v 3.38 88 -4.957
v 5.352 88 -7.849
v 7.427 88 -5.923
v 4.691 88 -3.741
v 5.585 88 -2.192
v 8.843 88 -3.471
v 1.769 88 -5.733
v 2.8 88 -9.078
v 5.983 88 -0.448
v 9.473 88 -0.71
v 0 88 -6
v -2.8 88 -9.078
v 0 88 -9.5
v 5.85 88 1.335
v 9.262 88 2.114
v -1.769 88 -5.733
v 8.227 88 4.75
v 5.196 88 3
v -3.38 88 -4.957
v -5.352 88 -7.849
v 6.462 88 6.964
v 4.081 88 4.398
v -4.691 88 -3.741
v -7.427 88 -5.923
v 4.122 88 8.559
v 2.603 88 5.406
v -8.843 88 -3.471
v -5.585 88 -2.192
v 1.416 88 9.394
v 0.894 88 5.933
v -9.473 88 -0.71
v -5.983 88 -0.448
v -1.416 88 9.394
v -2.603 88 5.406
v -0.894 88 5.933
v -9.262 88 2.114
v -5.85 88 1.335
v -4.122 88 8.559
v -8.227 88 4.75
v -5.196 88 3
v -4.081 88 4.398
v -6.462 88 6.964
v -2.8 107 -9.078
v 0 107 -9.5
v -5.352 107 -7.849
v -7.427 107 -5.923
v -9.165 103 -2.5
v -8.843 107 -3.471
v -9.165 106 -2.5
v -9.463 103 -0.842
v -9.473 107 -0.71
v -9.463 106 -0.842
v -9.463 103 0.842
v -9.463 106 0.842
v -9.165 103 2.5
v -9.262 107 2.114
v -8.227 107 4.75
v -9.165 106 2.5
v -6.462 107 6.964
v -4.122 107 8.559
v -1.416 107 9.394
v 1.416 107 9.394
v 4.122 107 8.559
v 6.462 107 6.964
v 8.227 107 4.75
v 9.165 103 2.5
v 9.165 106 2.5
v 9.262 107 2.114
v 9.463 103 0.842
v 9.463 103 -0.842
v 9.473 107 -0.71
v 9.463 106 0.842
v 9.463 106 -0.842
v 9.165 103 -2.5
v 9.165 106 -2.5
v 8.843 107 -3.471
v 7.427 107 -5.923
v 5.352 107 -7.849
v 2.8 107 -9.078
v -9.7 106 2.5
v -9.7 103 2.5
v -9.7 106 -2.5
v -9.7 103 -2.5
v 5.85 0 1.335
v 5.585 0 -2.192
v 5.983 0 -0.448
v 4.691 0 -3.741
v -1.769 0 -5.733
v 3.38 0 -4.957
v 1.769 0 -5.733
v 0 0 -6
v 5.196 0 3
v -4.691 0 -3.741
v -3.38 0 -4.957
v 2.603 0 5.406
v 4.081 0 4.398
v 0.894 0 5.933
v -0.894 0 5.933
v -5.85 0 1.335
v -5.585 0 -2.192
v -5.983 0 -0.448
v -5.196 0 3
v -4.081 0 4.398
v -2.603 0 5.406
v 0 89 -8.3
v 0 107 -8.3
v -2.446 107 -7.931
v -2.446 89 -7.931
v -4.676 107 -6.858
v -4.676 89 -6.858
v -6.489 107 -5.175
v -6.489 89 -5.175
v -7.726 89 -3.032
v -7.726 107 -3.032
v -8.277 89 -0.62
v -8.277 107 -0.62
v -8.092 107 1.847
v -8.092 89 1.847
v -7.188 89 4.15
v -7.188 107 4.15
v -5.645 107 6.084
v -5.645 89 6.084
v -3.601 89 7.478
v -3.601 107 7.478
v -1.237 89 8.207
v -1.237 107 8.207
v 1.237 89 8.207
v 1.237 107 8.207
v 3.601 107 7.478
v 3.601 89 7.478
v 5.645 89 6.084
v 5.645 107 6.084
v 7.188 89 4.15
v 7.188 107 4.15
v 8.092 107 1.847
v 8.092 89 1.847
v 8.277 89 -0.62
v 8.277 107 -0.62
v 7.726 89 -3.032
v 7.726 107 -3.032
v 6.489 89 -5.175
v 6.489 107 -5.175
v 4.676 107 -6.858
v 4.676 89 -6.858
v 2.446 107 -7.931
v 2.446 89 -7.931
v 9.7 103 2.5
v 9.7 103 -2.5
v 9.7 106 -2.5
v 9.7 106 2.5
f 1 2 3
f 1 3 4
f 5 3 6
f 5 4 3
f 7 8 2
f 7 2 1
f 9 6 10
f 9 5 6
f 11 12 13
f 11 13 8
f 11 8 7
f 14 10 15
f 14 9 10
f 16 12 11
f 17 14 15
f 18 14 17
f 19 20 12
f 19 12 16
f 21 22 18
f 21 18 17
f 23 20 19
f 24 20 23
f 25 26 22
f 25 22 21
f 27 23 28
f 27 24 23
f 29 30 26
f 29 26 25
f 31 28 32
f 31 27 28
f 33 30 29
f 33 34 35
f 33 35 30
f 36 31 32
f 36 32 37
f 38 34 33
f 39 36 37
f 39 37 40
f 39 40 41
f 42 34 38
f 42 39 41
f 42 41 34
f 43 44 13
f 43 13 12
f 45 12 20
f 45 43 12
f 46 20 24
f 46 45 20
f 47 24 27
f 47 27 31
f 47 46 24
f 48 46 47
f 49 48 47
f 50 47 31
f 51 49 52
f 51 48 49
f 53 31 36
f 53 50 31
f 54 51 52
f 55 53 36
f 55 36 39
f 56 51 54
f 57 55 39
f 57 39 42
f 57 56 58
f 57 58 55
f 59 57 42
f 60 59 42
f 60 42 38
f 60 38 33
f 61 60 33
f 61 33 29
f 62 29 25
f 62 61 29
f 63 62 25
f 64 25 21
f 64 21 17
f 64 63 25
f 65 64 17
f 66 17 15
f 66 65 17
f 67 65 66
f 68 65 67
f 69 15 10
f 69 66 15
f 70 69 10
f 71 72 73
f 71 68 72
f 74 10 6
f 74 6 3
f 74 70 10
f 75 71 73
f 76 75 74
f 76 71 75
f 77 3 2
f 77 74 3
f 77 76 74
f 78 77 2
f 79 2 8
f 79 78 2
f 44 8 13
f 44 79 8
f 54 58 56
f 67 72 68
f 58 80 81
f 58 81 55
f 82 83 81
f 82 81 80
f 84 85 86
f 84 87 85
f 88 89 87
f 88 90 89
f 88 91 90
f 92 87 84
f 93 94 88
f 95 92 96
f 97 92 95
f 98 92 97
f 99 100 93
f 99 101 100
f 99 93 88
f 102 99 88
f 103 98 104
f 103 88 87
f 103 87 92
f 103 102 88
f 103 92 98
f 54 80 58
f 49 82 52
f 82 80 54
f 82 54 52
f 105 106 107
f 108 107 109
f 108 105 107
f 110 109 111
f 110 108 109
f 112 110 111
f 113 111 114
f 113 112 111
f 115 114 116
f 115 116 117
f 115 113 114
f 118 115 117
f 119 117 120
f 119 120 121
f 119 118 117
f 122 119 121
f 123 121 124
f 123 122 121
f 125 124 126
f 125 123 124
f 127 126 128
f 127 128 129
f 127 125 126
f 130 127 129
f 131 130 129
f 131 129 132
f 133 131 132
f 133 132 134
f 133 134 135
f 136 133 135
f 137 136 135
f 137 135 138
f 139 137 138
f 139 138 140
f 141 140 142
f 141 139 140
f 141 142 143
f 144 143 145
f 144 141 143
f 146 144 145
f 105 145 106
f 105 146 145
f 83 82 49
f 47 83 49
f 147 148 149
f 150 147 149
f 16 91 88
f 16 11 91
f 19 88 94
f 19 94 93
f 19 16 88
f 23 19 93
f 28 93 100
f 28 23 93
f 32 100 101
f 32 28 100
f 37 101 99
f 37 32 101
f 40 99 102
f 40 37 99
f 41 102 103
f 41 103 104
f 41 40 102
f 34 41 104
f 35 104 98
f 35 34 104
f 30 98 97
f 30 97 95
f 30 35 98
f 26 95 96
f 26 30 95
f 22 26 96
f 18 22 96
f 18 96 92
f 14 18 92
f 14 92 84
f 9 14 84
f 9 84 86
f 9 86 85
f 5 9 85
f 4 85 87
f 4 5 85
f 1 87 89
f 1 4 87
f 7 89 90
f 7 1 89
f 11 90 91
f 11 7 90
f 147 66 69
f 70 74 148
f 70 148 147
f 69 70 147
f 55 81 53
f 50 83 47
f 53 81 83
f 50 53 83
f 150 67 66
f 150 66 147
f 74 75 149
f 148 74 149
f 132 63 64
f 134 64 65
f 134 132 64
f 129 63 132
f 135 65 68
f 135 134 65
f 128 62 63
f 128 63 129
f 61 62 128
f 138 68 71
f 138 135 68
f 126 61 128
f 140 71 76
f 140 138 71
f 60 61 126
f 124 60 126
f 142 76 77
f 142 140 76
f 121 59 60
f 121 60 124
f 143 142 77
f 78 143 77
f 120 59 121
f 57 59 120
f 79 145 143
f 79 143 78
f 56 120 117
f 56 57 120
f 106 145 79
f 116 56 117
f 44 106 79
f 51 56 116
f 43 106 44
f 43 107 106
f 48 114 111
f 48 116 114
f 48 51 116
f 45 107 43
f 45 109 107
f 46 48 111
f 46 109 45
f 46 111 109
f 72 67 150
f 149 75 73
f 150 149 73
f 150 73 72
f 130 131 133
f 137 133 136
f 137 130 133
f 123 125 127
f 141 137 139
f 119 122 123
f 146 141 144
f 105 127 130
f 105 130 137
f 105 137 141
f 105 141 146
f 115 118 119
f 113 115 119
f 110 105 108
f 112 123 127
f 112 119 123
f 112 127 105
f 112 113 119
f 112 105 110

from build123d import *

# Parameters (mm, degrees)
SKETCH_3_W          = 19.4
SKETCH_3_H          = 3
OUTPUT_KEY_DEPTH    = 5
D16_CLEARANCE_START = -18
SKETCH_4_R          = 8.3
D16_CLEARANCE_DEPTH = 18


with BuildPart() as part:
    # 草图1 → Stepped_output_tube (revolve)
    with BuildSketch(Plane.XY, mode=Mode.PRIVATE) as stepped_output_tube_sk:
        Polygon((0, 0), (6, 0), (6, 88), (9.5, 88), (9.5, 107), (8.3, 107), (8.3, 89), (0, 89), align=None)
    revolve(stepped_output_tube_sk.sketch.rotate(Axis((0, 0, 0), (0, 1, 0)), 90), axis=Axis((0, 0, 0), (0, 1, 0)))

    # 草图3 → Output_key (add)
    with BuildSketch(Plane.XY.offset(-2.5)):
        with Locations((0, 104.5)):
            Rectangle(SKETCH_3_W, SKETCH_3_H)
    extrude(amount=OUTPUT_KEY_DEPTH)

    # 草图4 → D16_clearance (cut)
    with BuildSketch(Plane(origin=(0, 107, 0), x_dir=(1, 0, 0), z_dir=(0, 1, 0)).offset(D16_CLEARANCE_START)):
        with Locations(Location((0, 0, 0), (0, 0, 90))):
            Circle(SKETCH_4_R)
    extrude(amount=D16_CLEARANCE_DEPTH, mode=Mode.SUBTRACT)


solid = part.part
